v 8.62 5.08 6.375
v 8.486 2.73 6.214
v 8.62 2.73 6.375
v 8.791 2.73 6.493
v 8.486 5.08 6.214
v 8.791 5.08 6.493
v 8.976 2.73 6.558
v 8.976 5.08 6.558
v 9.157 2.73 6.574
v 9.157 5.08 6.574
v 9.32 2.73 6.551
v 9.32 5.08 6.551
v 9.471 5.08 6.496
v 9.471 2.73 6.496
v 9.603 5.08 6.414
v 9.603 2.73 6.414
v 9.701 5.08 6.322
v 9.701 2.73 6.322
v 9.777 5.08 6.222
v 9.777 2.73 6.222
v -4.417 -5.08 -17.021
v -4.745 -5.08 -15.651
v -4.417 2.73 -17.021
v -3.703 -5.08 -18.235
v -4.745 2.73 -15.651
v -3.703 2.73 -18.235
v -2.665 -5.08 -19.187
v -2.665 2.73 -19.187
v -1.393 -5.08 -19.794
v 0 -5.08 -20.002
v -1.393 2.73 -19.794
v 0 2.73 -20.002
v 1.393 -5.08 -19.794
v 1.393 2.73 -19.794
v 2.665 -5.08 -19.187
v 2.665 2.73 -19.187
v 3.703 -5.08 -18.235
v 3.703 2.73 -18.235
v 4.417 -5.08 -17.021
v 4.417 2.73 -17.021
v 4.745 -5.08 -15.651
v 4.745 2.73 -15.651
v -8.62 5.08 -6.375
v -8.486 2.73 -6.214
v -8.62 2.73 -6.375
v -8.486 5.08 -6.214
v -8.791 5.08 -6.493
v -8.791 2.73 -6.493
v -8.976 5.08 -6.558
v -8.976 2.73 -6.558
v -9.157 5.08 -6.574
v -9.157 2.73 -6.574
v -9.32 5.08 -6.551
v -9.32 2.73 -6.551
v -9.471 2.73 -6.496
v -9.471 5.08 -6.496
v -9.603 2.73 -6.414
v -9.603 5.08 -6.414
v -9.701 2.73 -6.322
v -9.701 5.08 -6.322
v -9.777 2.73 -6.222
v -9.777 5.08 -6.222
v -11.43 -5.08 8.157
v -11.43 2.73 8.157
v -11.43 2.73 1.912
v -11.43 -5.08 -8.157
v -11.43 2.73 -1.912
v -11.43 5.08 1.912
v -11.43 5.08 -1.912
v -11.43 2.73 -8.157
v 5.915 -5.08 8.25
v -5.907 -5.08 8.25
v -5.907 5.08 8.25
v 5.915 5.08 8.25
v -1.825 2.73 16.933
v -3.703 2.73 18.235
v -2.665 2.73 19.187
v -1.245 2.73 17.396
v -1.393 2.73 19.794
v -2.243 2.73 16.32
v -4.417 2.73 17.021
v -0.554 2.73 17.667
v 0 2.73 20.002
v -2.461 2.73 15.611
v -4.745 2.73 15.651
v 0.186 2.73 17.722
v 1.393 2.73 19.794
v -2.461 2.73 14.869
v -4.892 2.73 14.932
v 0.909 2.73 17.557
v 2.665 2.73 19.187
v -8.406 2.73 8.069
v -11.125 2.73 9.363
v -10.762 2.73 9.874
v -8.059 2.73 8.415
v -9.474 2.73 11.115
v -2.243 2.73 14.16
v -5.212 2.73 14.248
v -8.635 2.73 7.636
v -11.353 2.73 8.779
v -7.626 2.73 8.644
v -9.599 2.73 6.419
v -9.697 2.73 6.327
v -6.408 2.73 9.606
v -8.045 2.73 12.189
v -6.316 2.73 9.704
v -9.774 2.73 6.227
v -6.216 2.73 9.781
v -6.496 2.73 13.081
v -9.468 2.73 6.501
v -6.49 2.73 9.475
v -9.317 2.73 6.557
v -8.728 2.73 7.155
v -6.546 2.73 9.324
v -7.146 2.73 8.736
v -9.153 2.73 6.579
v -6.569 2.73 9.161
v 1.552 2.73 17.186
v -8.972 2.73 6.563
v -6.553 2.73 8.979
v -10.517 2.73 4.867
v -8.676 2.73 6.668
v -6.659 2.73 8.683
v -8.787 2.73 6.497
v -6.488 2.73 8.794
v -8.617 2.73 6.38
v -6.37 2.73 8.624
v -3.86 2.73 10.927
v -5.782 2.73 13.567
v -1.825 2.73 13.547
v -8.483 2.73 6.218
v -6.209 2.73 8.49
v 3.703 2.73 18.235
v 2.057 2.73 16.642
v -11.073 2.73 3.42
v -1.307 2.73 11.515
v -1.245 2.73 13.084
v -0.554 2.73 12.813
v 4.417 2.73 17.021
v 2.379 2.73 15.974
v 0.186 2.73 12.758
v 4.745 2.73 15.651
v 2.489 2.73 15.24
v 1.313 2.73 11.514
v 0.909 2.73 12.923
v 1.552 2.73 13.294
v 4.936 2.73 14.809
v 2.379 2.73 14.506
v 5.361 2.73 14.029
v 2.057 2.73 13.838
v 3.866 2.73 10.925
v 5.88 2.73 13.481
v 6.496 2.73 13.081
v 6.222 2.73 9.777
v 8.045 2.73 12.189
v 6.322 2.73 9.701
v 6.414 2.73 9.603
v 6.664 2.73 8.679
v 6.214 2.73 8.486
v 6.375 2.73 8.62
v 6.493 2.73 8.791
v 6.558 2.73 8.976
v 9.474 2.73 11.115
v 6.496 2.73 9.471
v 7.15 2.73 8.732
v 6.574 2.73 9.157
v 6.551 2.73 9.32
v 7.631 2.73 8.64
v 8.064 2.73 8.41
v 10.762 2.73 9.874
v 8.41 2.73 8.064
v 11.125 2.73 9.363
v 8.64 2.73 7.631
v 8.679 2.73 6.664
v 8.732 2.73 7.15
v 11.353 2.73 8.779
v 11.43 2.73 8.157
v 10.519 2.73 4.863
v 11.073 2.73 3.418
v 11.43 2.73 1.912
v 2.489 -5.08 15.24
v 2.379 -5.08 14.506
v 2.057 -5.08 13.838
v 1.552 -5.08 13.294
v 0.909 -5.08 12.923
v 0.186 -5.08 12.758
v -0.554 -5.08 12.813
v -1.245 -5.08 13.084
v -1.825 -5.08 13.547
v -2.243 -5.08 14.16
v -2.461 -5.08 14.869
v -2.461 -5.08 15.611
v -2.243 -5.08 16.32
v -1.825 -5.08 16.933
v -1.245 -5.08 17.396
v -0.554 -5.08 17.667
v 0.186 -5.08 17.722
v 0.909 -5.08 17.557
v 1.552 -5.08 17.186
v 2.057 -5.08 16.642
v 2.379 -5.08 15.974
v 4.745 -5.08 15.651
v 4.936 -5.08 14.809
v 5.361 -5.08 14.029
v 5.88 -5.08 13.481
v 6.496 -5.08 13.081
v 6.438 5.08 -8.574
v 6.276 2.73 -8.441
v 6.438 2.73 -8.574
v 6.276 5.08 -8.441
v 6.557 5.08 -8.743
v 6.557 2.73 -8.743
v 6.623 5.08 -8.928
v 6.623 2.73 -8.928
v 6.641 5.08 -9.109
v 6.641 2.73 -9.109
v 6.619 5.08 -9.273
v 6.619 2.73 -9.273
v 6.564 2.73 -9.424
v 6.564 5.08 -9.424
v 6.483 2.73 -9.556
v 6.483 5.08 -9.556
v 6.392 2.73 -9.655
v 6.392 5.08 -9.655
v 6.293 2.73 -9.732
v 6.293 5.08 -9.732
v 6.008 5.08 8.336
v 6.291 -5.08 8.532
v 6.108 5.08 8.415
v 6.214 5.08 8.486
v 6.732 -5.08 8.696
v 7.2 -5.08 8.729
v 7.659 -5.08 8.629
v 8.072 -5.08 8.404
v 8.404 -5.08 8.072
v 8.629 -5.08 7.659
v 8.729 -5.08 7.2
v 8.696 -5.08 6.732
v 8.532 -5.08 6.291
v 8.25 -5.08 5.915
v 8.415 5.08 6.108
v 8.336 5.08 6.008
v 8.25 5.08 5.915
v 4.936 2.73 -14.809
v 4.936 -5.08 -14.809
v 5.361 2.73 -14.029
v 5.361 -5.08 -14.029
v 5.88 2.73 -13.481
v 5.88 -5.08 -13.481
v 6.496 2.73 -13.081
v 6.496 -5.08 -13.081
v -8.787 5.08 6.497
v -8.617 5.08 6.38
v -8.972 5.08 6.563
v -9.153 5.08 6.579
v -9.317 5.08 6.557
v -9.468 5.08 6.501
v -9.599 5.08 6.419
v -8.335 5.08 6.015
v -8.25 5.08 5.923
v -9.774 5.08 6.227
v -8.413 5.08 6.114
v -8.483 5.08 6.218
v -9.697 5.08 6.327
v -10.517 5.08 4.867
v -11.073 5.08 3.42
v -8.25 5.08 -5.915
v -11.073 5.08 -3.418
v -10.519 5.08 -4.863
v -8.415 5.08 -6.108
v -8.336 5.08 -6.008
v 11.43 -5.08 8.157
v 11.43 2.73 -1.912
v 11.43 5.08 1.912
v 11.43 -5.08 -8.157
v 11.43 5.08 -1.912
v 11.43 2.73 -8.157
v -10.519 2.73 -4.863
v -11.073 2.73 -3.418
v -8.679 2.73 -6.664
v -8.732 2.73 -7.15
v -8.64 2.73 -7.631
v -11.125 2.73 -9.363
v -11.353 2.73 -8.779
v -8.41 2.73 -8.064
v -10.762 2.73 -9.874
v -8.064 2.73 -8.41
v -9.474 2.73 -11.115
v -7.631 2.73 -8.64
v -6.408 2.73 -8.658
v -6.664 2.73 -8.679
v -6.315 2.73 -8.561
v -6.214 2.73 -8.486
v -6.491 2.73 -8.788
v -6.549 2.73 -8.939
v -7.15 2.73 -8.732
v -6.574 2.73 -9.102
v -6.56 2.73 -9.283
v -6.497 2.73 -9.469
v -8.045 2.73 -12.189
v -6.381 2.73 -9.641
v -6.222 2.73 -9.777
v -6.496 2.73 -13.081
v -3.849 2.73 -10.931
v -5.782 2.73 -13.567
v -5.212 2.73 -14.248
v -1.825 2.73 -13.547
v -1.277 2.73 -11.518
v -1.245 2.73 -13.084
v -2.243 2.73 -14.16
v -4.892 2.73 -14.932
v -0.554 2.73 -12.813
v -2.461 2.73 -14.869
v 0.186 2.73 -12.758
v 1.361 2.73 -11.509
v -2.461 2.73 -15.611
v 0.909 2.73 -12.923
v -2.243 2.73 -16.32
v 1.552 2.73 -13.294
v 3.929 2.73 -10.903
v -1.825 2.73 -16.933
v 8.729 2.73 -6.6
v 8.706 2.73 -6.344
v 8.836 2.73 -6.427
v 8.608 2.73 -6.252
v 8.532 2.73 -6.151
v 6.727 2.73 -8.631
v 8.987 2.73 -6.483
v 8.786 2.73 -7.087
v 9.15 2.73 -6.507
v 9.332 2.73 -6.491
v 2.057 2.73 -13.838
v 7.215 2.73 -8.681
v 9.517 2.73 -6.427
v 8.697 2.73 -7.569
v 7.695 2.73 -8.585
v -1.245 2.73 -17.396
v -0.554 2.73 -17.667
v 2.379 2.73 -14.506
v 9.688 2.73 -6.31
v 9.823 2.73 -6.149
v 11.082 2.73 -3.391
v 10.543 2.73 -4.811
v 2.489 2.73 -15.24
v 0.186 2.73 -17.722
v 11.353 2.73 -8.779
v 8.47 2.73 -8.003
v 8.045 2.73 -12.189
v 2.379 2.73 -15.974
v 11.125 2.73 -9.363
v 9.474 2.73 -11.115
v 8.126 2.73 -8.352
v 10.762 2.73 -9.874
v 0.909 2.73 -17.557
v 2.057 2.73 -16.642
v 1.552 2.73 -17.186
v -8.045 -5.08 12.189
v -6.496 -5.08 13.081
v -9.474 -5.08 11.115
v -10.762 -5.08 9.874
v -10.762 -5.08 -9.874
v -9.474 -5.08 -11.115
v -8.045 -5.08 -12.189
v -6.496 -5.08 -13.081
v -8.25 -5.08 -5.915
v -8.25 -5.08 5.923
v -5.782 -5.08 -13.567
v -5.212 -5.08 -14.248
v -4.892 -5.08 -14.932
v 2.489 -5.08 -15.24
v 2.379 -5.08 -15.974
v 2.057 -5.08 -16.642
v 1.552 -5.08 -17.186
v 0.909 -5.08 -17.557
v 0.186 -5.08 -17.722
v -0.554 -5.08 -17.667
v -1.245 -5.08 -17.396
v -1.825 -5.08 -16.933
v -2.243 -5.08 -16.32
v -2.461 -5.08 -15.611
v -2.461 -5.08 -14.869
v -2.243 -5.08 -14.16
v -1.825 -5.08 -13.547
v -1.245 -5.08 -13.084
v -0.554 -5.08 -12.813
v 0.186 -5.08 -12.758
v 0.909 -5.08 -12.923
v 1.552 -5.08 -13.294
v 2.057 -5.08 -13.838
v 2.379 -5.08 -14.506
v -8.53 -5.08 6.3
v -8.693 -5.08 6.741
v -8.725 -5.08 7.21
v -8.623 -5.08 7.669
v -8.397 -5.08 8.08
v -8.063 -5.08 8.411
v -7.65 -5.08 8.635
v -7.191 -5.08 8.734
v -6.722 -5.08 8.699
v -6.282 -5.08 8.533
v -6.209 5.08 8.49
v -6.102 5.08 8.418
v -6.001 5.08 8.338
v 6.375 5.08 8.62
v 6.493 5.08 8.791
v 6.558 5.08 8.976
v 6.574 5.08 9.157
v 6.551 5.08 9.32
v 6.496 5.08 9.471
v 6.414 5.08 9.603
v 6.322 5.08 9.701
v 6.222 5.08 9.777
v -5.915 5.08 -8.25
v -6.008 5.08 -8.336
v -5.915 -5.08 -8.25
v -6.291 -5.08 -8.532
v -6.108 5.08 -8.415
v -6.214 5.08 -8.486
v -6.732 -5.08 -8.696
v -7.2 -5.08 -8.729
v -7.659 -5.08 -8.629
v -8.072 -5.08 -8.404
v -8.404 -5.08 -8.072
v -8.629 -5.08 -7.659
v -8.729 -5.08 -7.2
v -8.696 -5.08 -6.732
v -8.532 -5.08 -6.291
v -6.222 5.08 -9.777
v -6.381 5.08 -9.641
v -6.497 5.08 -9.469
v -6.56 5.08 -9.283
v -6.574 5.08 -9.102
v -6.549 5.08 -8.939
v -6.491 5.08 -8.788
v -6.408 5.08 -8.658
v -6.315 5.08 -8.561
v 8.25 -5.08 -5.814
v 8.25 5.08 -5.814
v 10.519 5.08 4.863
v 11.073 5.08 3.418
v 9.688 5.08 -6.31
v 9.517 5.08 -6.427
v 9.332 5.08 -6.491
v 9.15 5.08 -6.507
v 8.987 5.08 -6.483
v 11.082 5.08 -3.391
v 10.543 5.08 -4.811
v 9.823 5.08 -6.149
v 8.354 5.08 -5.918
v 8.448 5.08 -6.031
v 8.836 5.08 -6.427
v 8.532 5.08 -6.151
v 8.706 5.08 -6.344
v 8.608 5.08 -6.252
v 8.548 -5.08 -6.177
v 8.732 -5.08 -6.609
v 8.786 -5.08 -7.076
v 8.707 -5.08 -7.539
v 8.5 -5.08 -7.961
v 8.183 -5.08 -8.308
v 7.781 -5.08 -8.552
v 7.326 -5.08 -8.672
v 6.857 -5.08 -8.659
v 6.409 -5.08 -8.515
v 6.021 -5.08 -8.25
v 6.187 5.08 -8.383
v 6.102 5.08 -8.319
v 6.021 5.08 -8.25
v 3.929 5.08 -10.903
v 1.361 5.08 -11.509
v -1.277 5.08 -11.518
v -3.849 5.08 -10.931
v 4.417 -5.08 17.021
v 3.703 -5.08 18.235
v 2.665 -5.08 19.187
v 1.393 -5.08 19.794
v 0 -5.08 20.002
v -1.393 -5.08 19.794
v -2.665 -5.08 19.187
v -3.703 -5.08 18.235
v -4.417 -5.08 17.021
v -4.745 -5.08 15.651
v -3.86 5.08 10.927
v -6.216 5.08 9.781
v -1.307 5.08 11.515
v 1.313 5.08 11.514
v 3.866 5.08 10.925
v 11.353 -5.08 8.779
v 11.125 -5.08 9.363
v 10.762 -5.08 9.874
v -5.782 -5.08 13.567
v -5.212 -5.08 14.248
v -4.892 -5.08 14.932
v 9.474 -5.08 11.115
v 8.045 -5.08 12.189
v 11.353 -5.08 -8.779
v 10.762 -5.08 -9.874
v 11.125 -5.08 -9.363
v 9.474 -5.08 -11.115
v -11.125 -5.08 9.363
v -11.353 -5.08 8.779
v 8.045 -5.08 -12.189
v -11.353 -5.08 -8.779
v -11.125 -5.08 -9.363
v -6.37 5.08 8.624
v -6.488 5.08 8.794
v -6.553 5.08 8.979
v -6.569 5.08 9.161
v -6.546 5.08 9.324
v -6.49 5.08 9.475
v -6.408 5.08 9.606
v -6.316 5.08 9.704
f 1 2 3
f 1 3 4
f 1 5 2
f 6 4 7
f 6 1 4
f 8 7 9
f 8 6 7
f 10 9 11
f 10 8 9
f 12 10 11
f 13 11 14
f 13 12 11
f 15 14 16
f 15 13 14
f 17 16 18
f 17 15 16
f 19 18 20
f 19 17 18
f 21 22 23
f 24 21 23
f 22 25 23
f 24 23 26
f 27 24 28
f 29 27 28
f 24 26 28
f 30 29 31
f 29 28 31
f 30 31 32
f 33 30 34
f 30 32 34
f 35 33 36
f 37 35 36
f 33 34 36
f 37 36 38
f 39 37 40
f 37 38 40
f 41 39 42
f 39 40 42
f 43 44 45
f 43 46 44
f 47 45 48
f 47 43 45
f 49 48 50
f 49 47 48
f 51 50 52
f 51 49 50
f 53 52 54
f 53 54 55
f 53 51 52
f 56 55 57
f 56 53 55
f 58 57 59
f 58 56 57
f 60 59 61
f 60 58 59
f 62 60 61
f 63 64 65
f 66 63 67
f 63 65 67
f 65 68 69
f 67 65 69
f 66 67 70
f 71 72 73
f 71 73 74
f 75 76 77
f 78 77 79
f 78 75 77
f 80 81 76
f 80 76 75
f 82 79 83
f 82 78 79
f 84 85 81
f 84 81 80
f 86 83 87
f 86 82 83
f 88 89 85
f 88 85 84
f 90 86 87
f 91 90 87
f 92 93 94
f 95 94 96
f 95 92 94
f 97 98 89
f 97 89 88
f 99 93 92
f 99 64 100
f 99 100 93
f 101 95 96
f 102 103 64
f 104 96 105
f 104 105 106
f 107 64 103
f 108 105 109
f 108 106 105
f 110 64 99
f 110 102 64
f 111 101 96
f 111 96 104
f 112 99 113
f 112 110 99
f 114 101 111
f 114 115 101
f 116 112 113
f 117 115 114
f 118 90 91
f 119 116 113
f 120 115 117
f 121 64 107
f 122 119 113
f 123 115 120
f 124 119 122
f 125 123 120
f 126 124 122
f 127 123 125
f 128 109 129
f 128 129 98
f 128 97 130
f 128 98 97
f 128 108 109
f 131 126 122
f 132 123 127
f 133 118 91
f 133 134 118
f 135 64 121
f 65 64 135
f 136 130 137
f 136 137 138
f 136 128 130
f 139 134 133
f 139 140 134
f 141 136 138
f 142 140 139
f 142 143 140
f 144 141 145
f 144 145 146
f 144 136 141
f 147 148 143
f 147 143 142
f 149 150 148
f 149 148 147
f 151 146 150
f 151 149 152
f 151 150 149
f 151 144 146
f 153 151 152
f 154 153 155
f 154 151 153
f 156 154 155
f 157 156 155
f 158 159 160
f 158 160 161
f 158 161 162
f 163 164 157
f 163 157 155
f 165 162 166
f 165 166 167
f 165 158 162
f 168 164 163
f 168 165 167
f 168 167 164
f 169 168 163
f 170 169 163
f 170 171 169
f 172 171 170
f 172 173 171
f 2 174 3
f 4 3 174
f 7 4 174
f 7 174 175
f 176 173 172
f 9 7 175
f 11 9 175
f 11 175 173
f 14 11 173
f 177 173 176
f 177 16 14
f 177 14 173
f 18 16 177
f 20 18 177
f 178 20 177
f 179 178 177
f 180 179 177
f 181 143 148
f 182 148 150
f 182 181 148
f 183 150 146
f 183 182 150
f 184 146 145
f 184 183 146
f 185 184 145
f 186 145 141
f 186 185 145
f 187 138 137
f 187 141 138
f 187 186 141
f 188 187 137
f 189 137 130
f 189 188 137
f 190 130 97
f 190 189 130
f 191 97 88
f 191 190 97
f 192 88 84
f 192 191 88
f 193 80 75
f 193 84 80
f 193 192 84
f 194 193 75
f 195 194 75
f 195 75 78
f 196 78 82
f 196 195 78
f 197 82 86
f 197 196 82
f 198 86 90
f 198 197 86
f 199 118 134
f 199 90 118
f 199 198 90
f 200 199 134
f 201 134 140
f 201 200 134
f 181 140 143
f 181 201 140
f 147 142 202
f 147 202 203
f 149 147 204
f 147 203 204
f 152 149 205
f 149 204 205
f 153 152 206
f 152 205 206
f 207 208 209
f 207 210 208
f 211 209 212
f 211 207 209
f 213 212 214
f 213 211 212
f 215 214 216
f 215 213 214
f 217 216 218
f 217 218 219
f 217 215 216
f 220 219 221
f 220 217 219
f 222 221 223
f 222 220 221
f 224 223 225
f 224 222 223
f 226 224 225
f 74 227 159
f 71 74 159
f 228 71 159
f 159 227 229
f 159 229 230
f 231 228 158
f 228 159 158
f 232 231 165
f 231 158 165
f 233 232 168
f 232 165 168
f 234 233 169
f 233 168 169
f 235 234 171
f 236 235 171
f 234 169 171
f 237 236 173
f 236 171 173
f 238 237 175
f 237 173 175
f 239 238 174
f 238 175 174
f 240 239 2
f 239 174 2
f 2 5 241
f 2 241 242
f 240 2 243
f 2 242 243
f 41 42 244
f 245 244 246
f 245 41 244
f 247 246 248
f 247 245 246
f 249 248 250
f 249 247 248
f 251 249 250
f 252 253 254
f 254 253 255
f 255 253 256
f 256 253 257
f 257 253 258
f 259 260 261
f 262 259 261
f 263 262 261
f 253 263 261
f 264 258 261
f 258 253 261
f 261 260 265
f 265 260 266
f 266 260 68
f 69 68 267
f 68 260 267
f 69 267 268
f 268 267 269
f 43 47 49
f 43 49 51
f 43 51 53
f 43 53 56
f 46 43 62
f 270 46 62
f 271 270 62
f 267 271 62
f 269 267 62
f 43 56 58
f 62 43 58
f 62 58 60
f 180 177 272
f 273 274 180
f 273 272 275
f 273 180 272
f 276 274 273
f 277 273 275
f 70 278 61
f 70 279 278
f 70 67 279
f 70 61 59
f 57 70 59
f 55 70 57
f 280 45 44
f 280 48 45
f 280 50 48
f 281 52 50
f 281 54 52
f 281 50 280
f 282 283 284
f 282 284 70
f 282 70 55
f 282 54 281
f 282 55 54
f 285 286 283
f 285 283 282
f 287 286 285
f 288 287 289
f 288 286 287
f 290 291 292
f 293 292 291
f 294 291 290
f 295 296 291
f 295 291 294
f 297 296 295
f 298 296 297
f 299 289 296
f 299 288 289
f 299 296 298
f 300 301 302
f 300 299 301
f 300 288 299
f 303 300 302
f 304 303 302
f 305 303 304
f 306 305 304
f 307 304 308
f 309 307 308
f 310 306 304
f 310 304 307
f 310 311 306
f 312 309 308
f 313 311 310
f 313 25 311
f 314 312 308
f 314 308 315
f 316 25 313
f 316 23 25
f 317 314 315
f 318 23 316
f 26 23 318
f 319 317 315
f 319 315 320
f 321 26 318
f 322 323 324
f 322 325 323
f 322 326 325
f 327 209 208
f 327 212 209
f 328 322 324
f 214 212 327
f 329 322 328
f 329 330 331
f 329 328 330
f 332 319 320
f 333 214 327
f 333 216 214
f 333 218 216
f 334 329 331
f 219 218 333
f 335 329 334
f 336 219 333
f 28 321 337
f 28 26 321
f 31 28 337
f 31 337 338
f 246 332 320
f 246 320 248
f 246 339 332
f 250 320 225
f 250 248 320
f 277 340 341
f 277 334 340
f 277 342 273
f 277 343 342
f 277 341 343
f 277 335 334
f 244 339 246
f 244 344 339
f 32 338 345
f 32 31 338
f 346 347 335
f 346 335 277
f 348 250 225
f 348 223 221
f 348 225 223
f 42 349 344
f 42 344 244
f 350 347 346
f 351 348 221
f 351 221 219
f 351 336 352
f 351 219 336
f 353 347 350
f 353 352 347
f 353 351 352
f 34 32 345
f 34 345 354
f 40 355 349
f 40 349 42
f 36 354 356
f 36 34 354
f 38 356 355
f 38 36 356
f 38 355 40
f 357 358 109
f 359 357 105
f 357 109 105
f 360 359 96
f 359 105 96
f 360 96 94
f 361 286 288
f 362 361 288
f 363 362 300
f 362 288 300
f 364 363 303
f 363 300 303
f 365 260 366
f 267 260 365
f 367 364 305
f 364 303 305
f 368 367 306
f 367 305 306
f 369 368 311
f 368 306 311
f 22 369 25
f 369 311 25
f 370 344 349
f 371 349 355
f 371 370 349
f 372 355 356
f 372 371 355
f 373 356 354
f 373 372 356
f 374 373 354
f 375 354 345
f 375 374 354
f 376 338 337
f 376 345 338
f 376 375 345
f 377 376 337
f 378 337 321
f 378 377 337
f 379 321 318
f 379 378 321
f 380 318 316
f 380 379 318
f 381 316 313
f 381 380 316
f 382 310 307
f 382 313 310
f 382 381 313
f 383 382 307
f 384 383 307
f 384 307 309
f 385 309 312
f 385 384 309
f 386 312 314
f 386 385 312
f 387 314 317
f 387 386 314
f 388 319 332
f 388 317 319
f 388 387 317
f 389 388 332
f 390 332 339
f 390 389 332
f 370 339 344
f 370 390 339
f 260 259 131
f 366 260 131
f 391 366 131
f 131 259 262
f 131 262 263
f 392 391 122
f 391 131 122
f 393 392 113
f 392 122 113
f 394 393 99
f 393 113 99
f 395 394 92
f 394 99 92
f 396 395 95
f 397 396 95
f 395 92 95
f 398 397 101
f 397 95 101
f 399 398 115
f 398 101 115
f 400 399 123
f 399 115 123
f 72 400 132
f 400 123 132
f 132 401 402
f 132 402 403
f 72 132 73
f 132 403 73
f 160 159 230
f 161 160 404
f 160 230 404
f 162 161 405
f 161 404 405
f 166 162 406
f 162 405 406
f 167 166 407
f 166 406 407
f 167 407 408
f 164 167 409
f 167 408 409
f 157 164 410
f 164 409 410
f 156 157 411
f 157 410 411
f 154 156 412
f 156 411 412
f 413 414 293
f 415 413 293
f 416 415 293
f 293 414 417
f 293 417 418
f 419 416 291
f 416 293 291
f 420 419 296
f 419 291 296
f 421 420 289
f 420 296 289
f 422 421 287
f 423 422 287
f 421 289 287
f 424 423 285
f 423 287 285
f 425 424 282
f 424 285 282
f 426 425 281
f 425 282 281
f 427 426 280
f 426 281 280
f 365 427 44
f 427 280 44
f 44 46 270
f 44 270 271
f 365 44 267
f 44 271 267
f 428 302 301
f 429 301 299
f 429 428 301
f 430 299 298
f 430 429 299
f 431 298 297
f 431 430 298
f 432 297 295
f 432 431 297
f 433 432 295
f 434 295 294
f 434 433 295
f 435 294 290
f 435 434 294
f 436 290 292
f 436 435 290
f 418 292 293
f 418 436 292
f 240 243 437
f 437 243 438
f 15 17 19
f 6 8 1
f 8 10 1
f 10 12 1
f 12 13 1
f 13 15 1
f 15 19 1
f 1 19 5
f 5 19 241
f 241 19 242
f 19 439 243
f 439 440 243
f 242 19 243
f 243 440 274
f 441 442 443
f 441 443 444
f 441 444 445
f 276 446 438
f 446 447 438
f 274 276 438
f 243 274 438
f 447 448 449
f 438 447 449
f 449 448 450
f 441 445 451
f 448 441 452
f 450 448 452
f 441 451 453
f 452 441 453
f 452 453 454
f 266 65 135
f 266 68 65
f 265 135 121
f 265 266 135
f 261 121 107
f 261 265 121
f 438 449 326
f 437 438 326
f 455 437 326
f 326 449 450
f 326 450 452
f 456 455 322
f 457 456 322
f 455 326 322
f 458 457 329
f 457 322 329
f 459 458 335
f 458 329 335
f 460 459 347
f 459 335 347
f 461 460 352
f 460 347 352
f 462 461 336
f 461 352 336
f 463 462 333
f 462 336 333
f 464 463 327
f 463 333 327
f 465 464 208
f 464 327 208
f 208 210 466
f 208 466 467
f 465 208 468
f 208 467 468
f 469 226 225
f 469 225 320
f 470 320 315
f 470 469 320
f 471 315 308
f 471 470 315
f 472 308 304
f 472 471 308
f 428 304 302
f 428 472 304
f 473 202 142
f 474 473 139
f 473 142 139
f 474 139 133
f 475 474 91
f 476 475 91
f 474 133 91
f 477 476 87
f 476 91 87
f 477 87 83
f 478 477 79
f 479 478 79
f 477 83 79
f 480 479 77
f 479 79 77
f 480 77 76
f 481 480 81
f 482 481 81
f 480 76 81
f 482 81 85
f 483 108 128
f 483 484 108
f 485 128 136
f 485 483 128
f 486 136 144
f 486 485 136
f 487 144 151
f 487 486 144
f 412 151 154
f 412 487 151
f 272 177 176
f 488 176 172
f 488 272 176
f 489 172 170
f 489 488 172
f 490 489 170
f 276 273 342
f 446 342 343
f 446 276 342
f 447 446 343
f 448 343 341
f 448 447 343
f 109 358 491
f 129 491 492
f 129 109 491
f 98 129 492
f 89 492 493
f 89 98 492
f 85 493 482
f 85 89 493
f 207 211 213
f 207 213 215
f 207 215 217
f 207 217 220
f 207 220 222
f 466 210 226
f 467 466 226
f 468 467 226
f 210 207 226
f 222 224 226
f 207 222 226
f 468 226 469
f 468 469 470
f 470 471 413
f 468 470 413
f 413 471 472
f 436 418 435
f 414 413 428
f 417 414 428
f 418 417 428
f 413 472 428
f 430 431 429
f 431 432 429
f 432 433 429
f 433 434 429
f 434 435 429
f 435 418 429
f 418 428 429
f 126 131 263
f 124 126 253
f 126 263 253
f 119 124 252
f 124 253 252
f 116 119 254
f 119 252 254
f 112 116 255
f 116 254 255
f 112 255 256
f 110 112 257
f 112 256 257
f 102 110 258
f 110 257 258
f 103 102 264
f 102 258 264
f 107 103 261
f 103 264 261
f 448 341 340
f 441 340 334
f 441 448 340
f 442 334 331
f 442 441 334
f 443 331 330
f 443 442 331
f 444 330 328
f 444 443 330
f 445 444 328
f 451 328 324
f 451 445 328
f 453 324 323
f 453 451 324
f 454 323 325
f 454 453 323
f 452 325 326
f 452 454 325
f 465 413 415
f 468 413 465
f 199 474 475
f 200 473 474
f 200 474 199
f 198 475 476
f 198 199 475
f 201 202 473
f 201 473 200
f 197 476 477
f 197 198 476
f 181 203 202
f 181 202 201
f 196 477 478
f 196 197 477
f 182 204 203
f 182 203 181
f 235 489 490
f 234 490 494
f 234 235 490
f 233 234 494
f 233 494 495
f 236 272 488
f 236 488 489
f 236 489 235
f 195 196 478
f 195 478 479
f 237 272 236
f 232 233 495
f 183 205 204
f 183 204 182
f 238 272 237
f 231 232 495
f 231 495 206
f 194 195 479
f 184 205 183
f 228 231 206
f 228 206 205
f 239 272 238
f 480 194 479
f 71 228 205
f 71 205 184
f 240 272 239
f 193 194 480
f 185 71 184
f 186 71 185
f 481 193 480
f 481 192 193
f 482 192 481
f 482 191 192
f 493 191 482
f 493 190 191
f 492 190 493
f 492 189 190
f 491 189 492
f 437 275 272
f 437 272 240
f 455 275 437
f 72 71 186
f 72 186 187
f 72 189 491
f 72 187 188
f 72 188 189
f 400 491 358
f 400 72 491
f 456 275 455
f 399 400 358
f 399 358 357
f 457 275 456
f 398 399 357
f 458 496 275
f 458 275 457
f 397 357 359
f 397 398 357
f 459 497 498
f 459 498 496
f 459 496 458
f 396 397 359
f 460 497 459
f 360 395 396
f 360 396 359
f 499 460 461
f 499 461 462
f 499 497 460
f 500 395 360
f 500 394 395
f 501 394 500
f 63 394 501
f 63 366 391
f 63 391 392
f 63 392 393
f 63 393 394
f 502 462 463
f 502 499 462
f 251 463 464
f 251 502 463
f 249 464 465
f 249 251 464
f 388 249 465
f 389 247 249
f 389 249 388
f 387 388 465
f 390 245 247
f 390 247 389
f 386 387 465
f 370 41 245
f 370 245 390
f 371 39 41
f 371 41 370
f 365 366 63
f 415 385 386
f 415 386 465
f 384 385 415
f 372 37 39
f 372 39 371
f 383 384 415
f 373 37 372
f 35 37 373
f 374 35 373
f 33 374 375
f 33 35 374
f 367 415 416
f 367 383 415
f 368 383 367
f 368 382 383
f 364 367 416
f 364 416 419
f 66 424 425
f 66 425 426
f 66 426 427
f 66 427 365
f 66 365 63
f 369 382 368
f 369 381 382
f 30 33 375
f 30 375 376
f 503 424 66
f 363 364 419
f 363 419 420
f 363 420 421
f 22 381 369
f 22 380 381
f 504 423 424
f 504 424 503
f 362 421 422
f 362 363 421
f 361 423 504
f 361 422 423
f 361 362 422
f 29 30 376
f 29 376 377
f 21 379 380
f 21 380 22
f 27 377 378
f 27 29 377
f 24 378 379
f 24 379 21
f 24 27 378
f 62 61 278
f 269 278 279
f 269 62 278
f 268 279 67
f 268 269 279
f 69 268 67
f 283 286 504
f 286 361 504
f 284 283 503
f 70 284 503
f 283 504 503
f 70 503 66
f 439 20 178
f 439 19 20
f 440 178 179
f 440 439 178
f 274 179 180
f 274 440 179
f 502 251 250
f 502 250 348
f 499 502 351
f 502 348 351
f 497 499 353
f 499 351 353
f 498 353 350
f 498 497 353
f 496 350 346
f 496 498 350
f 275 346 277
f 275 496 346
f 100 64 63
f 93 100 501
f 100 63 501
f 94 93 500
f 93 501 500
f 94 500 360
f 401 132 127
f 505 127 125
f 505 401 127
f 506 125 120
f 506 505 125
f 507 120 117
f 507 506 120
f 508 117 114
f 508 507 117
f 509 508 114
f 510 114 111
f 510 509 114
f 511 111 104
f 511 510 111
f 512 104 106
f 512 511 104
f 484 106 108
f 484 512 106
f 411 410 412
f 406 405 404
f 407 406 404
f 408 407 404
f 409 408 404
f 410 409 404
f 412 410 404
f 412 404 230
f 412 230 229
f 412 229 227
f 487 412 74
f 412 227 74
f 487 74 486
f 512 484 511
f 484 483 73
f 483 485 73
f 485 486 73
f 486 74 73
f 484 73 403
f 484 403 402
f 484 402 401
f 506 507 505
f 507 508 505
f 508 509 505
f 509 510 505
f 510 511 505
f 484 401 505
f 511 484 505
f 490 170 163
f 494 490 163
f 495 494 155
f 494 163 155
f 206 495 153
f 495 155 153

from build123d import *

# Parameters (mm, degrees)
SKETCH1_R           = 2.4892
SKETCH1_W           = 16.49984
SKETCH1_H           = 16.49984
BOSS_EXTRUDE1_DEPTH = 5.08
CUT_EXTRUDE1_DEPTH  = 11.16
SKETCH4_R           = 20.0025
SKETCH4_R_2         = 11.58875
CUT_EXTRUDE2_DEPTH  = 2.3495
SKETCH6_R           = 1.651
CUT_EXTRUDE3_DEPTH  = 11.16
FILLET1_R           = 0.762
FILLET2_R           = 3.175
FILLET3_R           = 2.54


with BuildPart() as part:
    # Sketch1 → Boss-Extrude1 (new body, symmetric)
    with BuildSketch(Plane(origin=(0, 0, 0), x_dir=(1, 0, 0), z_dir=(0, 1, 0))):
        with BuildLine():
            ThreePointArc((-4.56242174, 13.874088542), (0, 20.0025), (4.56242174, 13.874088542))
            ThreePointArc((4.56242174, 13.874088542), (14.605, 0), (4.56242174, -13.874088542))
            ThreePointArc((4.56242174, -13.874088542), (0, -20.0025), (-4.56242174, -13.874088542))
            ThreePointArc((-4.56242174, -13.874088542), (-14.605, 0), (-4.56242174, 13.874088542))
        make_face()
        with Locations((0, 15.24)):
            Circle(SKETCH1_R, mode=Mode.SUBTRACT)
        with Locations((0, -15.24)):
            Circle(SKETCH1_R, mode=Mode.SUBTRACT)
        Rectangle(SKETCH1_W, SKETCH1_H, mode=Mode.SUBTRACT)
    extrude(amount=BOSS_EXTRUDE1_DEPTH, both=True)

    # Sketch2 → Cut-Extrude1 (cut, through all)
    with BuildSketch(Plane(origin=(0, 5.08, 0), x_dir=(1, 0, 0), z_dir=(0, 1, 0))):
        with BuildLine():
            Line((-11.43, -9.091816375), (-11.43, 9.091816375))
            ThreePointArc((-11.43, 9.091816375), (-14.605, 0), (-11.43, -9.091816375))
        make_face()
        with BuildLine():
            Line((11.43, -9.091816375), (11.43, 9.091816375))
            ThreePointArc((11.43, 9.091816375), (14.605, 0), (11.43, -9.091816375))
        make_face()
    extrude(amount=-CUT_EXTRUDE1_DEPTH, mode=Mode.SUBTRACT)

    # Sketch4 → Cut-Extrude2 (cut)
    with BuildSketch(Plane(origin=(0, 5.08, 0), x_dir=(1, 0, 0), z_dir=(0, 1, 0))):
        Circle(SKETCH4_R)
        Circle(SKETCH4_R_2, mode=Mode.SUBTRACT)
    extrude(amount=-CUT_EXTRUDE2_DEPTH, mode=Mode.SUBTRACT)

    # Sketch6 → Cut-Extrude3 (cut, through all)
    with BuildSketch(Plane(origin=(0, 5.08, 0), x_dir=(1, 0, 0), z_dir=(0, 1, 0))):
        with Locations((-7.082486704, 7.082486704)):
            Circle(SKETCH6_R)
        with Locations((7.135507627, 7.031771379)):
            Circle(SKETCH6_R)
        with Locations((7.082486704, -7.082486704)):
            Circle(SKETCH6_R)
        with Locations((-7.078544383, -7.086442383)):
            Circle(SKETCH6_R)
    extrude(amount=-CUT_EXTRUDE3_DEPTH, mode=Mode.SUBTRACT)

    # Fillet1
    fillet1_edges = [part.edges().sort_by_distance(p)[0] for p in [
        (-8.567823829, 3.90525, -7.803301954),
        (7.861200497, 3.90525, -8.514731547),
        (7.803301954, 3.90525, 8.567823829),
        (-7.798496392, 3.90525, 8.572198119),
        (-8.563496345, 3.90525, 7.808050776),
        (8.567823829, 3.90525, 7.803301954),
        (8.628935612, 3.90525, -7.735670415),
        (-7.803301954, 3.90525, -8.567823829),
    ]]
    fillet(fillet1_edges, radius=FILLET1_R)

    # Fillet2
    fillet2_edges = [part.edges().sort_by_distance(p)[0] for p in [
        (-4.56242174, -1.17475, -13.874088542),
        (4.56242174, -1.17475, -13.874088542),
        (4.56242174, -1.17475, 13.874088542),
        (-4.56242174, -1.17475, 13.874088542),
    ]]
    fillet(fillet2_edges, radius=FILLET2_R)

    # Fillet3
    fillet3_edges = [part.edges().sort_by_distance(p)[0] for p in [
        (-11.43, -1.17475, 9.091816375),
        (-11.43, -1.17475, -9.091816375),
        (11.43, -1.17475, -9.091816375),
        (11.43, -1.17475, 9.091816375),
    ]]
    fillet(fillet3_edges, radius=FILLET3_R)


solid = part.part
